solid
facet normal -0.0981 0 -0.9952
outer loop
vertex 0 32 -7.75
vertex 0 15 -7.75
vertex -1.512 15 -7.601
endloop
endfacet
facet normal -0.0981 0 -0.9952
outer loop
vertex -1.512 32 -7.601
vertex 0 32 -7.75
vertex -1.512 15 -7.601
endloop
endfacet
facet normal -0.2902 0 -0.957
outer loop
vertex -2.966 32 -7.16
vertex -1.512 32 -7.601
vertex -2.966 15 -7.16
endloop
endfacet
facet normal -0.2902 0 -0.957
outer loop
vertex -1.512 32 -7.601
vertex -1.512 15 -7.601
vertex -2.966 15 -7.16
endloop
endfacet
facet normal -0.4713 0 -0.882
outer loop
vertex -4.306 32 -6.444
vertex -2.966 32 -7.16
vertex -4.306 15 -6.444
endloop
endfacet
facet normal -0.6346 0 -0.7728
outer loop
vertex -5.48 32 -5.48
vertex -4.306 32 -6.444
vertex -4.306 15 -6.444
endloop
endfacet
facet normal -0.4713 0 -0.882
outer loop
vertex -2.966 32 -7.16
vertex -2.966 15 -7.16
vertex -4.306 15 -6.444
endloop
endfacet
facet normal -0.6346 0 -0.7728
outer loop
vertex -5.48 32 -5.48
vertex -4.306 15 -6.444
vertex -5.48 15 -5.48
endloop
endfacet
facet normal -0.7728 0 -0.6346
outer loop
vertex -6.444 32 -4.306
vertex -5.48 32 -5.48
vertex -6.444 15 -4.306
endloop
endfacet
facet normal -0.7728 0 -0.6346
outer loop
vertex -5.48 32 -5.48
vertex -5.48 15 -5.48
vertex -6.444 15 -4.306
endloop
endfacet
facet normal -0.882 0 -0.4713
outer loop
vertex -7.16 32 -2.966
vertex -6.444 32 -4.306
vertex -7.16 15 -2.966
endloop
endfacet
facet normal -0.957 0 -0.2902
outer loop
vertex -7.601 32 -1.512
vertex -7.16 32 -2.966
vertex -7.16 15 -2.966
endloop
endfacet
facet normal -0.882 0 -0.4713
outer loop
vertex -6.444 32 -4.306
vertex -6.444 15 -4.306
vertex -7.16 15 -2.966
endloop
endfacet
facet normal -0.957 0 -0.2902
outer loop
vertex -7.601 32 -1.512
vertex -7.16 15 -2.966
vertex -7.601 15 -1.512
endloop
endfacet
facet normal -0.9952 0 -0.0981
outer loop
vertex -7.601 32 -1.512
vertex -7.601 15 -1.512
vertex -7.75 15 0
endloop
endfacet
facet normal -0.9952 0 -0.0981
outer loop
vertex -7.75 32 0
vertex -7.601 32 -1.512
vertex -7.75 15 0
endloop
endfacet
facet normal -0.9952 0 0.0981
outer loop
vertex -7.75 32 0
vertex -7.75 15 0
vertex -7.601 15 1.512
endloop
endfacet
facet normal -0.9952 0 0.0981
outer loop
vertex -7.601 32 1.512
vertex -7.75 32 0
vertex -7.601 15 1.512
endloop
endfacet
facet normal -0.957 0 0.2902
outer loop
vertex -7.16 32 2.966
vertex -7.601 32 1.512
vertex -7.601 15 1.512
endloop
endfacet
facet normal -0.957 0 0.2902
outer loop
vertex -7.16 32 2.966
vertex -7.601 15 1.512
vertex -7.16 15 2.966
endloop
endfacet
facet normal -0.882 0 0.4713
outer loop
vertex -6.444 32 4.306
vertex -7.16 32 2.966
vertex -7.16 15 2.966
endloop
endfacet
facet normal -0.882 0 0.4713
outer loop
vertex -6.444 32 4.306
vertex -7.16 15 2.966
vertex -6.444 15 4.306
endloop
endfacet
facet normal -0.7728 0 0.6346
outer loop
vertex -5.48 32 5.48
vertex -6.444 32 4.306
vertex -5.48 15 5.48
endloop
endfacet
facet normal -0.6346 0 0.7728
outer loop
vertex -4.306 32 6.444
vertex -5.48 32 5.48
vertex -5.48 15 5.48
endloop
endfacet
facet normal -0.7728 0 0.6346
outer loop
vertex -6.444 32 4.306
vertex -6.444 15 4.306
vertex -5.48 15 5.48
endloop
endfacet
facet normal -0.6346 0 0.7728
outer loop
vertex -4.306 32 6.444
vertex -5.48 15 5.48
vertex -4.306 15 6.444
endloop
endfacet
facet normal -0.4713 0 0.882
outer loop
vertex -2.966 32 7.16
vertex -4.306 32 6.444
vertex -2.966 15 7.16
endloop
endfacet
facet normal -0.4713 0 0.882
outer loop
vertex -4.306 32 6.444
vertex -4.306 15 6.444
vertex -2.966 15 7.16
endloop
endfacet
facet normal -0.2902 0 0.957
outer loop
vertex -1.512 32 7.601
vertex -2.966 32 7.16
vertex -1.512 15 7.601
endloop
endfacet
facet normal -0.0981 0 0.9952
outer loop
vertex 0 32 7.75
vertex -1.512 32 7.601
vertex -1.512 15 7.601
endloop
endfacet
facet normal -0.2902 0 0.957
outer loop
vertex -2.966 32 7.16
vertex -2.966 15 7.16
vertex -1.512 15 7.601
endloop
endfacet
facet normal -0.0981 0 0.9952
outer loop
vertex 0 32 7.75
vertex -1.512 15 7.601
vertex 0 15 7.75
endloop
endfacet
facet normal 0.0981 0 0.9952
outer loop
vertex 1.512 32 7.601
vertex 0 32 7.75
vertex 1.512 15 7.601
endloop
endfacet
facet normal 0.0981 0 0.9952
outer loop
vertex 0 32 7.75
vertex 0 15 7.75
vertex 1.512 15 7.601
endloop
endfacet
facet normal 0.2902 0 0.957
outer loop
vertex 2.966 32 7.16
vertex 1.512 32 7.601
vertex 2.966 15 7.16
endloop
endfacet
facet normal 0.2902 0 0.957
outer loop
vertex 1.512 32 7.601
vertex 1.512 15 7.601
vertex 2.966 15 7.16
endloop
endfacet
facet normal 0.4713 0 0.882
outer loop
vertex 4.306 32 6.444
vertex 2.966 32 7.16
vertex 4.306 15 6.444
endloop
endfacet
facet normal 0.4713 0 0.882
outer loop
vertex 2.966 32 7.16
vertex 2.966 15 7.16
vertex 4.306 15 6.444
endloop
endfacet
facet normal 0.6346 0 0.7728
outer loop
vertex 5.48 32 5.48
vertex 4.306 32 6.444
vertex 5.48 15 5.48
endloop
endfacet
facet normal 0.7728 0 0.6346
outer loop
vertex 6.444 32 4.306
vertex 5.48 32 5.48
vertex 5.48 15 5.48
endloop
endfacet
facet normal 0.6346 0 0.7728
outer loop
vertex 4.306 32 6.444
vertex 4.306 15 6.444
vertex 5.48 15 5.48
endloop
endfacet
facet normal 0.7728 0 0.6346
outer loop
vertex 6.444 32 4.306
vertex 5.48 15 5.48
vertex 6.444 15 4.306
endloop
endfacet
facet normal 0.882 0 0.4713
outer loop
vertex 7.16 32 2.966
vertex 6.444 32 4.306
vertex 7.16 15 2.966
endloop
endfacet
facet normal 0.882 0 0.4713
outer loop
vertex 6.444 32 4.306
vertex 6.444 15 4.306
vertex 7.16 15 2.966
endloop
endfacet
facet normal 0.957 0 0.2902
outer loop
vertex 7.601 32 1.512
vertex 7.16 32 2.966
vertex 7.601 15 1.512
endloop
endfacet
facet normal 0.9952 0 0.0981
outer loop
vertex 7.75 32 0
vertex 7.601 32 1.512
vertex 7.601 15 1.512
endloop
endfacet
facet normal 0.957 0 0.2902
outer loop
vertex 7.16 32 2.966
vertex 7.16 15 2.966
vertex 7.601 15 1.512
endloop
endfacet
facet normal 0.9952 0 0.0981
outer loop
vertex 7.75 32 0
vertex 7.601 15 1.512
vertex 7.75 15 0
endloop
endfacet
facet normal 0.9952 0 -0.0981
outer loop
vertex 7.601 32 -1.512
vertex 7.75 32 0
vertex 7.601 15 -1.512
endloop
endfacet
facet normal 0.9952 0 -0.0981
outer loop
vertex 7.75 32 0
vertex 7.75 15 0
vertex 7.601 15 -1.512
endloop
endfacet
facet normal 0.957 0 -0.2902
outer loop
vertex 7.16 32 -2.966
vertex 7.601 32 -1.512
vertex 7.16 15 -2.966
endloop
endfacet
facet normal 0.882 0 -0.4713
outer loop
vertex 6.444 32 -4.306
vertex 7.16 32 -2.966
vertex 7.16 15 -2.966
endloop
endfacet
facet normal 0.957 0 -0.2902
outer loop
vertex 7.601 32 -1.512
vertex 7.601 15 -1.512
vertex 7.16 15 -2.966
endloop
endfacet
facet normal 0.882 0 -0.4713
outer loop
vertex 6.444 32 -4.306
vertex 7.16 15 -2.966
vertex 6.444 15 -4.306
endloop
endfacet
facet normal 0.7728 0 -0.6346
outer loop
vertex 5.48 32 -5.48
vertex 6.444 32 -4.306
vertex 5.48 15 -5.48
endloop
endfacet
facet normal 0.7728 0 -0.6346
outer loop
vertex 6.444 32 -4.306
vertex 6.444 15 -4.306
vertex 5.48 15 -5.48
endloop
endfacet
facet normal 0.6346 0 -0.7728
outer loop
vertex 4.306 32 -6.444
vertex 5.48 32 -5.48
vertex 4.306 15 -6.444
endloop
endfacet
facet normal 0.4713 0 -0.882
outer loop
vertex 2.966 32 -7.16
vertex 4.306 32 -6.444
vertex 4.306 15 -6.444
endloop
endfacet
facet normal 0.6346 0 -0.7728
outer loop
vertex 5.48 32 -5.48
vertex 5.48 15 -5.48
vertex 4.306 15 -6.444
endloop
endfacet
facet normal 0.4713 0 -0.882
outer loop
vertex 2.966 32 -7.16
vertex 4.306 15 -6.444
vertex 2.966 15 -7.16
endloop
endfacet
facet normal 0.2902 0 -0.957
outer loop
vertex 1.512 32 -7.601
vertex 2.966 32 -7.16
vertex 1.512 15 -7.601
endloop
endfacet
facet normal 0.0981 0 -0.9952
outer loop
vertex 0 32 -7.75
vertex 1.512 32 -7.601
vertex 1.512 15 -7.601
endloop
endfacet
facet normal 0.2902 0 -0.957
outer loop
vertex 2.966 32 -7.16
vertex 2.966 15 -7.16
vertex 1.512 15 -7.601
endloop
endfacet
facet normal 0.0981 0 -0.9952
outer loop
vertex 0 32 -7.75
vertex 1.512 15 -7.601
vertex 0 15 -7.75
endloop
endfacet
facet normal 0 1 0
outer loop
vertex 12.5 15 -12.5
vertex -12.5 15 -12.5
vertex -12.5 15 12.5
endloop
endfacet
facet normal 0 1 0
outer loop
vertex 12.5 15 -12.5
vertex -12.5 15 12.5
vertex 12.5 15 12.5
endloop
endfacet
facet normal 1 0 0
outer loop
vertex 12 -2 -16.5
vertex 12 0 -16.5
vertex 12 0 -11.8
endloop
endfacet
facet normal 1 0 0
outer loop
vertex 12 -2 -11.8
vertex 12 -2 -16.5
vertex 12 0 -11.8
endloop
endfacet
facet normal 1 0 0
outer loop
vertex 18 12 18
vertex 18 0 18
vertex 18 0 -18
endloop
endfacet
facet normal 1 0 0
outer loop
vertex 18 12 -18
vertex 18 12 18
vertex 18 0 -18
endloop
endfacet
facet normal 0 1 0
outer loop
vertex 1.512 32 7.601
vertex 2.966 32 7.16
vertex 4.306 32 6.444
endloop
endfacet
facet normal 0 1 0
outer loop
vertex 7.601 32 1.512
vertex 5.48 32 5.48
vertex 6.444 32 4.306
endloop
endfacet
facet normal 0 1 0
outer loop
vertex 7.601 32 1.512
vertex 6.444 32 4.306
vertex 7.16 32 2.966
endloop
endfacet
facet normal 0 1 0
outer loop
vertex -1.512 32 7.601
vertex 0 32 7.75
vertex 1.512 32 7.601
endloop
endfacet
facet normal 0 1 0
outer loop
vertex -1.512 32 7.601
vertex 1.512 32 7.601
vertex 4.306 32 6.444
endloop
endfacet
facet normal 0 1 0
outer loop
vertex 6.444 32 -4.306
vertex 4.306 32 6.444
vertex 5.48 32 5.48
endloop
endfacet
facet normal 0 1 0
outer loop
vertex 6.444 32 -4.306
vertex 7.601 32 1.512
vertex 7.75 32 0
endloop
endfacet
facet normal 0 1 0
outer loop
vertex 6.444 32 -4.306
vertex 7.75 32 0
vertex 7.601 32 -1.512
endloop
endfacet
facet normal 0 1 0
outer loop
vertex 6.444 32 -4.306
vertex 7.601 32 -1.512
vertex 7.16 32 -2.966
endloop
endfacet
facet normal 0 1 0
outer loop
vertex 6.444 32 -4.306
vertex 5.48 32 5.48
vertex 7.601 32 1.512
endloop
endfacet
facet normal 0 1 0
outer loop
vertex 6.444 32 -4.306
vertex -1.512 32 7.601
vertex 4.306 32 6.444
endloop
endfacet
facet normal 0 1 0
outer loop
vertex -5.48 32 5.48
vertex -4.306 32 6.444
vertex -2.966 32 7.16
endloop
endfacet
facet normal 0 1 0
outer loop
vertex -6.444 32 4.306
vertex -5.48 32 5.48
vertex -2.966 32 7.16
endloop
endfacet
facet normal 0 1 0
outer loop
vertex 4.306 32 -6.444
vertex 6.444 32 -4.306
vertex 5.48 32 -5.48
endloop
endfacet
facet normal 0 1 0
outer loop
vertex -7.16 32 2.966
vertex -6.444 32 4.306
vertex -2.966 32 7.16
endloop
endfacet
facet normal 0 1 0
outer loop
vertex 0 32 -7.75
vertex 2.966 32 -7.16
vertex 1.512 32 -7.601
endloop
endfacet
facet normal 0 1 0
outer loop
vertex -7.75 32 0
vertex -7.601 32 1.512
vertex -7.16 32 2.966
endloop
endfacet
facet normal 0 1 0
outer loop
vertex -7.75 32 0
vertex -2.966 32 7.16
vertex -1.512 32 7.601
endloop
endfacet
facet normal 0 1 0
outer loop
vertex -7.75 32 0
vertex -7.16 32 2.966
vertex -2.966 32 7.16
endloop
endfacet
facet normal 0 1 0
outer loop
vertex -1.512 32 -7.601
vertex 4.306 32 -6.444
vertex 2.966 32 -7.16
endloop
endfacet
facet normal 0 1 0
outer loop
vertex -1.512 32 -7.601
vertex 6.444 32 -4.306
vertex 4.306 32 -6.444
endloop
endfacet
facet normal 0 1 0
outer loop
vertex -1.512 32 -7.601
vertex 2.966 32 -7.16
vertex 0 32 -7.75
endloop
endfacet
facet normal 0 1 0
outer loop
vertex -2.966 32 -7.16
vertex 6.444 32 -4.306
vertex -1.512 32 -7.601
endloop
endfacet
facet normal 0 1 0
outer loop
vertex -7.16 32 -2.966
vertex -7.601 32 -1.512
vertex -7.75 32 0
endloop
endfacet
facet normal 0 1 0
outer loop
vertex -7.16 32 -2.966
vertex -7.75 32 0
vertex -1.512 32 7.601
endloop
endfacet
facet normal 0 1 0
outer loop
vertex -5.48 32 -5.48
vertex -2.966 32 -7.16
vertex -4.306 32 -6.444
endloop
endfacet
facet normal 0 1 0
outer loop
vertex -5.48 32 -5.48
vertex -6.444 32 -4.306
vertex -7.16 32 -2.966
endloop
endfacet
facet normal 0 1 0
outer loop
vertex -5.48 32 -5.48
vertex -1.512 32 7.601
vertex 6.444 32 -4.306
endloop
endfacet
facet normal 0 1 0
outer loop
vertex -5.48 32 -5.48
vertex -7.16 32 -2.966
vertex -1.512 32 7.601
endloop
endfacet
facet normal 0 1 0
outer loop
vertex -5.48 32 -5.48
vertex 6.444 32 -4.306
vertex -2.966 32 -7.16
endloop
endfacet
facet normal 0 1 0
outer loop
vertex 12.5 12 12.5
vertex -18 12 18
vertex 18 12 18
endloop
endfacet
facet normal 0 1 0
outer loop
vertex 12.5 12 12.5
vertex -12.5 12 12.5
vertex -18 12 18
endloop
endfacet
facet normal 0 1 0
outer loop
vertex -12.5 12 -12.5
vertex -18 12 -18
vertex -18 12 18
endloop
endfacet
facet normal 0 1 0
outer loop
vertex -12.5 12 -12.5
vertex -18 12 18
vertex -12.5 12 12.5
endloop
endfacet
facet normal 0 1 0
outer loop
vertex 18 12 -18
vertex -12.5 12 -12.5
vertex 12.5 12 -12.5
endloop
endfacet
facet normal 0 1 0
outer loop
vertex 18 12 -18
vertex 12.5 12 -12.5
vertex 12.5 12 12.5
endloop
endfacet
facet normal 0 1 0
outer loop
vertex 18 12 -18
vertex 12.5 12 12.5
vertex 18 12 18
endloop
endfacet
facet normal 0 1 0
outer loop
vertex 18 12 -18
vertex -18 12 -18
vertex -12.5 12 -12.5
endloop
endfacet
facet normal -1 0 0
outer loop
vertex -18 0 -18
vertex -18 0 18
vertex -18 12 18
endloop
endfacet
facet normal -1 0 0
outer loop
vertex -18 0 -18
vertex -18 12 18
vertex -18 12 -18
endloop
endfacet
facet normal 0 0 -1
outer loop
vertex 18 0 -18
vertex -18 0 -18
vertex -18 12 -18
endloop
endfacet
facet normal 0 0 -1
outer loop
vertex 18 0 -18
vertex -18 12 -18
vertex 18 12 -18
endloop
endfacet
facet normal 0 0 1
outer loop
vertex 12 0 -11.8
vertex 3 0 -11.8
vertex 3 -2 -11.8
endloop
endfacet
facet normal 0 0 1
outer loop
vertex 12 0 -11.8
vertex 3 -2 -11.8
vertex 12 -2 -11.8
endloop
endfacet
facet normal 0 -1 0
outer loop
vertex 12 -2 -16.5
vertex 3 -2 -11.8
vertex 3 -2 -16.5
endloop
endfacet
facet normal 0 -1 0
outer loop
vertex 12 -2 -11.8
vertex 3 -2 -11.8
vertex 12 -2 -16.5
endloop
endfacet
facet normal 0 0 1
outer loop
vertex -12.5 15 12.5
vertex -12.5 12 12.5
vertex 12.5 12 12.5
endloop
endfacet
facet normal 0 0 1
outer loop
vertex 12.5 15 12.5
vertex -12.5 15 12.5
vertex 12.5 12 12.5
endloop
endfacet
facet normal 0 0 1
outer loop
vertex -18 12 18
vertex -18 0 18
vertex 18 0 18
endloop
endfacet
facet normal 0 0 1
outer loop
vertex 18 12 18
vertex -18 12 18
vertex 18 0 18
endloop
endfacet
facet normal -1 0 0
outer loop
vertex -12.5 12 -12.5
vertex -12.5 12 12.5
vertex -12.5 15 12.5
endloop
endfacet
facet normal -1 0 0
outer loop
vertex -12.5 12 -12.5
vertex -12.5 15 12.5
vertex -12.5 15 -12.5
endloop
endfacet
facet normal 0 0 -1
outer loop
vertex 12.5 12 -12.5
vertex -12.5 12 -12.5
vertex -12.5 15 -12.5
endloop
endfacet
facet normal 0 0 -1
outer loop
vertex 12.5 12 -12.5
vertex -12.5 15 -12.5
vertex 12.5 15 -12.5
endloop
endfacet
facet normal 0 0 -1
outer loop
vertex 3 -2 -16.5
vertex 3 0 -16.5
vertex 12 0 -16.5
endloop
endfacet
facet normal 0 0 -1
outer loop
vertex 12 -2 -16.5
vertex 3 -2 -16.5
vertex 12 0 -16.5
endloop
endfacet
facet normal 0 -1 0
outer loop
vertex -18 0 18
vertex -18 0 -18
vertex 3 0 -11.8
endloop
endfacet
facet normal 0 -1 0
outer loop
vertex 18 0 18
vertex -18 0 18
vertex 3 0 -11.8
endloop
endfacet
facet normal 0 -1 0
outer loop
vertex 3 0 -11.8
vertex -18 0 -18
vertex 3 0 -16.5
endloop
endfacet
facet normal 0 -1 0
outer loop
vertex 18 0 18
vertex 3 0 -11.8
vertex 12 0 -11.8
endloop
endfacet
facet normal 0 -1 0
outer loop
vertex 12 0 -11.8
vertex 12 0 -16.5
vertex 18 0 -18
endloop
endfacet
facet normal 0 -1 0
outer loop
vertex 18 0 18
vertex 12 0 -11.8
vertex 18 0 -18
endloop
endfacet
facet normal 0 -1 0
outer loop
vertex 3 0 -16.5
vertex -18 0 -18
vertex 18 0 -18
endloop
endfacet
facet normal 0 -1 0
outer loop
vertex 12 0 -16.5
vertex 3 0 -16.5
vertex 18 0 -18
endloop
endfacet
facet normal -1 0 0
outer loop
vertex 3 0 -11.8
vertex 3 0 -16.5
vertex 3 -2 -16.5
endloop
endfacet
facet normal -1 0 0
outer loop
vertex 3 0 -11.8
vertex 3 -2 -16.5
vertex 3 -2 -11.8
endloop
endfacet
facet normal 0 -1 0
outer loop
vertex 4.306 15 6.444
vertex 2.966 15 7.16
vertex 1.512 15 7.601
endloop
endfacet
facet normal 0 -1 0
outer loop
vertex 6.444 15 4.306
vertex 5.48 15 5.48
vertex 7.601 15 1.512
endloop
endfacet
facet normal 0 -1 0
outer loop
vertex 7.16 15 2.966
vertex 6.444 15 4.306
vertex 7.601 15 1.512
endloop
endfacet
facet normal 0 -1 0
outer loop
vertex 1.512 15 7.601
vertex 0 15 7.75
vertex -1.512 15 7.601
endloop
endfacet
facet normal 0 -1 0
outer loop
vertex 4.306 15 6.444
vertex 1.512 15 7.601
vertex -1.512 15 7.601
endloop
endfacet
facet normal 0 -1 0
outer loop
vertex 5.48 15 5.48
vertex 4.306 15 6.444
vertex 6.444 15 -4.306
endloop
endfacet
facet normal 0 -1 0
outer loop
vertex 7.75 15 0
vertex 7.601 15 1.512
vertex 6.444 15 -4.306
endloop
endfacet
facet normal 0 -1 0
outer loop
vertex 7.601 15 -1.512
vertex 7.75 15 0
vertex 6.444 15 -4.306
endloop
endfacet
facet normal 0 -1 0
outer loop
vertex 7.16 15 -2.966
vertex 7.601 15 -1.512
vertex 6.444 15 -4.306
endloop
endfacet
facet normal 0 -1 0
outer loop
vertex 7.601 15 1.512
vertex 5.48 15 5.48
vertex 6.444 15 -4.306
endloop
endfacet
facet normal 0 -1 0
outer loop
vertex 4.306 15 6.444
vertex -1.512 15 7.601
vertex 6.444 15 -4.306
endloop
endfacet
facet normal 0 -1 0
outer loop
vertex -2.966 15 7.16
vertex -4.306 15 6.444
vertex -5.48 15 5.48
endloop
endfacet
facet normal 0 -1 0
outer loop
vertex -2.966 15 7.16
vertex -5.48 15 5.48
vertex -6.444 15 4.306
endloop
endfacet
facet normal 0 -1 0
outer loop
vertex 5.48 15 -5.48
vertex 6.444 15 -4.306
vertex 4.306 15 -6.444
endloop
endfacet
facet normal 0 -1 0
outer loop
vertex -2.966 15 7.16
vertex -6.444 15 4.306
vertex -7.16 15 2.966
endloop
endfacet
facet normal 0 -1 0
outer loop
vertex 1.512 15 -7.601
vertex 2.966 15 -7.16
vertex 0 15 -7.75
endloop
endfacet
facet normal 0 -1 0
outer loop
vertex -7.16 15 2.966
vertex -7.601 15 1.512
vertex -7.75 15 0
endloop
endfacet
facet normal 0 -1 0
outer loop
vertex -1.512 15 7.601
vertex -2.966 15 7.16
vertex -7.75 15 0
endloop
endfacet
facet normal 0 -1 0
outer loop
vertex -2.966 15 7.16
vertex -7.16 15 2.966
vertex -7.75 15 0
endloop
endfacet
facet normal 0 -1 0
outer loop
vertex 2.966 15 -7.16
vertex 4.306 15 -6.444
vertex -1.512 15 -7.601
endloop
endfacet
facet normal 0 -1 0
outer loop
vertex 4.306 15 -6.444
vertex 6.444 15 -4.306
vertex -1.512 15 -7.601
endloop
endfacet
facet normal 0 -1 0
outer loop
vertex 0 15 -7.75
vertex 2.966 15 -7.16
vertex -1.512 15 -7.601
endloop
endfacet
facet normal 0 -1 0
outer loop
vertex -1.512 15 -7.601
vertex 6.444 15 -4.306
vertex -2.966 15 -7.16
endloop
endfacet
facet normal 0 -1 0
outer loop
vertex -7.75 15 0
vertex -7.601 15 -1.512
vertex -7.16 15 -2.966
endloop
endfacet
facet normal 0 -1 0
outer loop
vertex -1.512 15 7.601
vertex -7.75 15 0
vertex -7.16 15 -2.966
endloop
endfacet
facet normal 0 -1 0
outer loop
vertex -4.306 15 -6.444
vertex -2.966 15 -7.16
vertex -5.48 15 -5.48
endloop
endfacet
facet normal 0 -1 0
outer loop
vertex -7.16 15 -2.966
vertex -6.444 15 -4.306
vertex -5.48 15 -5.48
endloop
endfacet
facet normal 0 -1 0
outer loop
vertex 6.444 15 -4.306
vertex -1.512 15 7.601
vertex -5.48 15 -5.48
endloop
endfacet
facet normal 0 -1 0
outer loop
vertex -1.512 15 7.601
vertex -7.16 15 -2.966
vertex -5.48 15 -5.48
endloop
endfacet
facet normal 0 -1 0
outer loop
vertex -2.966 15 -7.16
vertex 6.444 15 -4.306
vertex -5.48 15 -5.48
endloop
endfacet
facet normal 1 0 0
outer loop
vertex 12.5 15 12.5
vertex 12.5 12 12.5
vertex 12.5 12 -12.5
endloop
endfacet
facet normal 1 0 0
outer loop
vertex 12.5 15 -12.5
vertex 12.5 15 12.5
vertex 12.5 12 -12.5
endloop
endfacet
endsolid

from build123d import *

# Parameters (mm, degrees)
SKETCH_1_W      = 36
SKETCH_1_H      = 36
SKETCH_1_W_2    = 25
SKETCH_1_H_2    = 25
SKETCH_1_R      = 7.75
EXTRUDE_2_DEPTH = 12
EXTRUDE_START   = 12
SKETCH_1_3_W    = 25
SKETCH_1_3_H    = 25
SKETCH_1_3_R    = 7.75
EXTRUDE_3_DEPTH = 3
EXTRUDE_START_2 = 15
SKETCH_1_5_R    = 7.75
EXTRUDE_4_DEPTH = 17
SKETCH_2_W      = 9
SKETCH_2_H      = 4.7
EXTRUDE_5_DEPTH = 2


with BuildPart() as part:
    # 草图1 → 凸台-拉伸2 (new body)
    # profile 1 of 3: a face of its own
    with BuildSketch(Plane(origin=(0, 0, 0), x_dir=(1, 0, 0), z_dir=(0, 1, 0))):
        Rectangle(SKETCH_1_W, SKETCH_1_H)
        Rectangle(SKETCH_1_W_2, SKETCH_1_H_2, mode=Mode.SUBTRACT)
    # profile 2 of 3: a face of its own
    with BuildSketch(Plane(origin=(0, 0, 0), x_dir=(1, 0, 0), z_dir=(0, 1, 0))):
        Rectangle(SKETCH_1_W_2, SKETCH_1_H_2)
        Circle(SKETCH_1_R, mode=Mode.SUBTRACT)
    # profile 3 of 3: a face of its own
    with BuildSketch(Plane(origin=(0, 0, 0), x_dir=(1, 0, 0), z_dir=(0, 1, 0))):
        Circle(SKETCH_1_R)
    extrude(amount=EXTRUDE_2_DEPTH)

    # 草图1<3> → 凸台-拉伸3 (add)
    # profile 1 of 2: a face of its own
    with BuildSketch(Plane(origin=(0, 0, 0), x_dir=(1, 0, 0), z_dir=(0, 1, 0)).offset(EXTRUDE_START)):
        Rectangle(SKETCH_1_3_W, SKETCH_1_3_H)
        Circle(SKETCH_1_3_R, mode=Mode.SUBTRACT)
    # profile 2 of 2: a face of its own
    with BuildSketch(Plane(origin=(0, 0, 0), x_dir=(1, 0, 0), z_dir=(0, 1, 0)).offset(EXTRUDE_START)):
        Circle(SKETCH_1_3_R)
    extrude(amount=EXTRUDE_3_DEPTH)

    # 草图2 → 凸台-拉伸5 (add)
    with BuildSketch(Plane.XZ):
        with Locations((7.5, -14.15)):
            Rectangle(SKETCH_2_W, SKETCH_2_H)
    extrude(amount=EXTRUDE_5_DEPTH)


with BuildPart() as body_2:
    # 草图1<5> → 凸台-拉伸4 (new body)
    with BuildSketch(Plane(origin=(0, 0, 0), x_dir=(1, 0, 0), z_dir=(0, 1, 0)).offset(EXTRUDE_START_2)):
        with Locations(Location((0, 0, 0), (0, 0, 90))):
            Circle(SKETCH_1_5_R)
    extrude(amount=EXTRUDE_4_DEPTH)


solid = Compound([part.part, body_2.part])
